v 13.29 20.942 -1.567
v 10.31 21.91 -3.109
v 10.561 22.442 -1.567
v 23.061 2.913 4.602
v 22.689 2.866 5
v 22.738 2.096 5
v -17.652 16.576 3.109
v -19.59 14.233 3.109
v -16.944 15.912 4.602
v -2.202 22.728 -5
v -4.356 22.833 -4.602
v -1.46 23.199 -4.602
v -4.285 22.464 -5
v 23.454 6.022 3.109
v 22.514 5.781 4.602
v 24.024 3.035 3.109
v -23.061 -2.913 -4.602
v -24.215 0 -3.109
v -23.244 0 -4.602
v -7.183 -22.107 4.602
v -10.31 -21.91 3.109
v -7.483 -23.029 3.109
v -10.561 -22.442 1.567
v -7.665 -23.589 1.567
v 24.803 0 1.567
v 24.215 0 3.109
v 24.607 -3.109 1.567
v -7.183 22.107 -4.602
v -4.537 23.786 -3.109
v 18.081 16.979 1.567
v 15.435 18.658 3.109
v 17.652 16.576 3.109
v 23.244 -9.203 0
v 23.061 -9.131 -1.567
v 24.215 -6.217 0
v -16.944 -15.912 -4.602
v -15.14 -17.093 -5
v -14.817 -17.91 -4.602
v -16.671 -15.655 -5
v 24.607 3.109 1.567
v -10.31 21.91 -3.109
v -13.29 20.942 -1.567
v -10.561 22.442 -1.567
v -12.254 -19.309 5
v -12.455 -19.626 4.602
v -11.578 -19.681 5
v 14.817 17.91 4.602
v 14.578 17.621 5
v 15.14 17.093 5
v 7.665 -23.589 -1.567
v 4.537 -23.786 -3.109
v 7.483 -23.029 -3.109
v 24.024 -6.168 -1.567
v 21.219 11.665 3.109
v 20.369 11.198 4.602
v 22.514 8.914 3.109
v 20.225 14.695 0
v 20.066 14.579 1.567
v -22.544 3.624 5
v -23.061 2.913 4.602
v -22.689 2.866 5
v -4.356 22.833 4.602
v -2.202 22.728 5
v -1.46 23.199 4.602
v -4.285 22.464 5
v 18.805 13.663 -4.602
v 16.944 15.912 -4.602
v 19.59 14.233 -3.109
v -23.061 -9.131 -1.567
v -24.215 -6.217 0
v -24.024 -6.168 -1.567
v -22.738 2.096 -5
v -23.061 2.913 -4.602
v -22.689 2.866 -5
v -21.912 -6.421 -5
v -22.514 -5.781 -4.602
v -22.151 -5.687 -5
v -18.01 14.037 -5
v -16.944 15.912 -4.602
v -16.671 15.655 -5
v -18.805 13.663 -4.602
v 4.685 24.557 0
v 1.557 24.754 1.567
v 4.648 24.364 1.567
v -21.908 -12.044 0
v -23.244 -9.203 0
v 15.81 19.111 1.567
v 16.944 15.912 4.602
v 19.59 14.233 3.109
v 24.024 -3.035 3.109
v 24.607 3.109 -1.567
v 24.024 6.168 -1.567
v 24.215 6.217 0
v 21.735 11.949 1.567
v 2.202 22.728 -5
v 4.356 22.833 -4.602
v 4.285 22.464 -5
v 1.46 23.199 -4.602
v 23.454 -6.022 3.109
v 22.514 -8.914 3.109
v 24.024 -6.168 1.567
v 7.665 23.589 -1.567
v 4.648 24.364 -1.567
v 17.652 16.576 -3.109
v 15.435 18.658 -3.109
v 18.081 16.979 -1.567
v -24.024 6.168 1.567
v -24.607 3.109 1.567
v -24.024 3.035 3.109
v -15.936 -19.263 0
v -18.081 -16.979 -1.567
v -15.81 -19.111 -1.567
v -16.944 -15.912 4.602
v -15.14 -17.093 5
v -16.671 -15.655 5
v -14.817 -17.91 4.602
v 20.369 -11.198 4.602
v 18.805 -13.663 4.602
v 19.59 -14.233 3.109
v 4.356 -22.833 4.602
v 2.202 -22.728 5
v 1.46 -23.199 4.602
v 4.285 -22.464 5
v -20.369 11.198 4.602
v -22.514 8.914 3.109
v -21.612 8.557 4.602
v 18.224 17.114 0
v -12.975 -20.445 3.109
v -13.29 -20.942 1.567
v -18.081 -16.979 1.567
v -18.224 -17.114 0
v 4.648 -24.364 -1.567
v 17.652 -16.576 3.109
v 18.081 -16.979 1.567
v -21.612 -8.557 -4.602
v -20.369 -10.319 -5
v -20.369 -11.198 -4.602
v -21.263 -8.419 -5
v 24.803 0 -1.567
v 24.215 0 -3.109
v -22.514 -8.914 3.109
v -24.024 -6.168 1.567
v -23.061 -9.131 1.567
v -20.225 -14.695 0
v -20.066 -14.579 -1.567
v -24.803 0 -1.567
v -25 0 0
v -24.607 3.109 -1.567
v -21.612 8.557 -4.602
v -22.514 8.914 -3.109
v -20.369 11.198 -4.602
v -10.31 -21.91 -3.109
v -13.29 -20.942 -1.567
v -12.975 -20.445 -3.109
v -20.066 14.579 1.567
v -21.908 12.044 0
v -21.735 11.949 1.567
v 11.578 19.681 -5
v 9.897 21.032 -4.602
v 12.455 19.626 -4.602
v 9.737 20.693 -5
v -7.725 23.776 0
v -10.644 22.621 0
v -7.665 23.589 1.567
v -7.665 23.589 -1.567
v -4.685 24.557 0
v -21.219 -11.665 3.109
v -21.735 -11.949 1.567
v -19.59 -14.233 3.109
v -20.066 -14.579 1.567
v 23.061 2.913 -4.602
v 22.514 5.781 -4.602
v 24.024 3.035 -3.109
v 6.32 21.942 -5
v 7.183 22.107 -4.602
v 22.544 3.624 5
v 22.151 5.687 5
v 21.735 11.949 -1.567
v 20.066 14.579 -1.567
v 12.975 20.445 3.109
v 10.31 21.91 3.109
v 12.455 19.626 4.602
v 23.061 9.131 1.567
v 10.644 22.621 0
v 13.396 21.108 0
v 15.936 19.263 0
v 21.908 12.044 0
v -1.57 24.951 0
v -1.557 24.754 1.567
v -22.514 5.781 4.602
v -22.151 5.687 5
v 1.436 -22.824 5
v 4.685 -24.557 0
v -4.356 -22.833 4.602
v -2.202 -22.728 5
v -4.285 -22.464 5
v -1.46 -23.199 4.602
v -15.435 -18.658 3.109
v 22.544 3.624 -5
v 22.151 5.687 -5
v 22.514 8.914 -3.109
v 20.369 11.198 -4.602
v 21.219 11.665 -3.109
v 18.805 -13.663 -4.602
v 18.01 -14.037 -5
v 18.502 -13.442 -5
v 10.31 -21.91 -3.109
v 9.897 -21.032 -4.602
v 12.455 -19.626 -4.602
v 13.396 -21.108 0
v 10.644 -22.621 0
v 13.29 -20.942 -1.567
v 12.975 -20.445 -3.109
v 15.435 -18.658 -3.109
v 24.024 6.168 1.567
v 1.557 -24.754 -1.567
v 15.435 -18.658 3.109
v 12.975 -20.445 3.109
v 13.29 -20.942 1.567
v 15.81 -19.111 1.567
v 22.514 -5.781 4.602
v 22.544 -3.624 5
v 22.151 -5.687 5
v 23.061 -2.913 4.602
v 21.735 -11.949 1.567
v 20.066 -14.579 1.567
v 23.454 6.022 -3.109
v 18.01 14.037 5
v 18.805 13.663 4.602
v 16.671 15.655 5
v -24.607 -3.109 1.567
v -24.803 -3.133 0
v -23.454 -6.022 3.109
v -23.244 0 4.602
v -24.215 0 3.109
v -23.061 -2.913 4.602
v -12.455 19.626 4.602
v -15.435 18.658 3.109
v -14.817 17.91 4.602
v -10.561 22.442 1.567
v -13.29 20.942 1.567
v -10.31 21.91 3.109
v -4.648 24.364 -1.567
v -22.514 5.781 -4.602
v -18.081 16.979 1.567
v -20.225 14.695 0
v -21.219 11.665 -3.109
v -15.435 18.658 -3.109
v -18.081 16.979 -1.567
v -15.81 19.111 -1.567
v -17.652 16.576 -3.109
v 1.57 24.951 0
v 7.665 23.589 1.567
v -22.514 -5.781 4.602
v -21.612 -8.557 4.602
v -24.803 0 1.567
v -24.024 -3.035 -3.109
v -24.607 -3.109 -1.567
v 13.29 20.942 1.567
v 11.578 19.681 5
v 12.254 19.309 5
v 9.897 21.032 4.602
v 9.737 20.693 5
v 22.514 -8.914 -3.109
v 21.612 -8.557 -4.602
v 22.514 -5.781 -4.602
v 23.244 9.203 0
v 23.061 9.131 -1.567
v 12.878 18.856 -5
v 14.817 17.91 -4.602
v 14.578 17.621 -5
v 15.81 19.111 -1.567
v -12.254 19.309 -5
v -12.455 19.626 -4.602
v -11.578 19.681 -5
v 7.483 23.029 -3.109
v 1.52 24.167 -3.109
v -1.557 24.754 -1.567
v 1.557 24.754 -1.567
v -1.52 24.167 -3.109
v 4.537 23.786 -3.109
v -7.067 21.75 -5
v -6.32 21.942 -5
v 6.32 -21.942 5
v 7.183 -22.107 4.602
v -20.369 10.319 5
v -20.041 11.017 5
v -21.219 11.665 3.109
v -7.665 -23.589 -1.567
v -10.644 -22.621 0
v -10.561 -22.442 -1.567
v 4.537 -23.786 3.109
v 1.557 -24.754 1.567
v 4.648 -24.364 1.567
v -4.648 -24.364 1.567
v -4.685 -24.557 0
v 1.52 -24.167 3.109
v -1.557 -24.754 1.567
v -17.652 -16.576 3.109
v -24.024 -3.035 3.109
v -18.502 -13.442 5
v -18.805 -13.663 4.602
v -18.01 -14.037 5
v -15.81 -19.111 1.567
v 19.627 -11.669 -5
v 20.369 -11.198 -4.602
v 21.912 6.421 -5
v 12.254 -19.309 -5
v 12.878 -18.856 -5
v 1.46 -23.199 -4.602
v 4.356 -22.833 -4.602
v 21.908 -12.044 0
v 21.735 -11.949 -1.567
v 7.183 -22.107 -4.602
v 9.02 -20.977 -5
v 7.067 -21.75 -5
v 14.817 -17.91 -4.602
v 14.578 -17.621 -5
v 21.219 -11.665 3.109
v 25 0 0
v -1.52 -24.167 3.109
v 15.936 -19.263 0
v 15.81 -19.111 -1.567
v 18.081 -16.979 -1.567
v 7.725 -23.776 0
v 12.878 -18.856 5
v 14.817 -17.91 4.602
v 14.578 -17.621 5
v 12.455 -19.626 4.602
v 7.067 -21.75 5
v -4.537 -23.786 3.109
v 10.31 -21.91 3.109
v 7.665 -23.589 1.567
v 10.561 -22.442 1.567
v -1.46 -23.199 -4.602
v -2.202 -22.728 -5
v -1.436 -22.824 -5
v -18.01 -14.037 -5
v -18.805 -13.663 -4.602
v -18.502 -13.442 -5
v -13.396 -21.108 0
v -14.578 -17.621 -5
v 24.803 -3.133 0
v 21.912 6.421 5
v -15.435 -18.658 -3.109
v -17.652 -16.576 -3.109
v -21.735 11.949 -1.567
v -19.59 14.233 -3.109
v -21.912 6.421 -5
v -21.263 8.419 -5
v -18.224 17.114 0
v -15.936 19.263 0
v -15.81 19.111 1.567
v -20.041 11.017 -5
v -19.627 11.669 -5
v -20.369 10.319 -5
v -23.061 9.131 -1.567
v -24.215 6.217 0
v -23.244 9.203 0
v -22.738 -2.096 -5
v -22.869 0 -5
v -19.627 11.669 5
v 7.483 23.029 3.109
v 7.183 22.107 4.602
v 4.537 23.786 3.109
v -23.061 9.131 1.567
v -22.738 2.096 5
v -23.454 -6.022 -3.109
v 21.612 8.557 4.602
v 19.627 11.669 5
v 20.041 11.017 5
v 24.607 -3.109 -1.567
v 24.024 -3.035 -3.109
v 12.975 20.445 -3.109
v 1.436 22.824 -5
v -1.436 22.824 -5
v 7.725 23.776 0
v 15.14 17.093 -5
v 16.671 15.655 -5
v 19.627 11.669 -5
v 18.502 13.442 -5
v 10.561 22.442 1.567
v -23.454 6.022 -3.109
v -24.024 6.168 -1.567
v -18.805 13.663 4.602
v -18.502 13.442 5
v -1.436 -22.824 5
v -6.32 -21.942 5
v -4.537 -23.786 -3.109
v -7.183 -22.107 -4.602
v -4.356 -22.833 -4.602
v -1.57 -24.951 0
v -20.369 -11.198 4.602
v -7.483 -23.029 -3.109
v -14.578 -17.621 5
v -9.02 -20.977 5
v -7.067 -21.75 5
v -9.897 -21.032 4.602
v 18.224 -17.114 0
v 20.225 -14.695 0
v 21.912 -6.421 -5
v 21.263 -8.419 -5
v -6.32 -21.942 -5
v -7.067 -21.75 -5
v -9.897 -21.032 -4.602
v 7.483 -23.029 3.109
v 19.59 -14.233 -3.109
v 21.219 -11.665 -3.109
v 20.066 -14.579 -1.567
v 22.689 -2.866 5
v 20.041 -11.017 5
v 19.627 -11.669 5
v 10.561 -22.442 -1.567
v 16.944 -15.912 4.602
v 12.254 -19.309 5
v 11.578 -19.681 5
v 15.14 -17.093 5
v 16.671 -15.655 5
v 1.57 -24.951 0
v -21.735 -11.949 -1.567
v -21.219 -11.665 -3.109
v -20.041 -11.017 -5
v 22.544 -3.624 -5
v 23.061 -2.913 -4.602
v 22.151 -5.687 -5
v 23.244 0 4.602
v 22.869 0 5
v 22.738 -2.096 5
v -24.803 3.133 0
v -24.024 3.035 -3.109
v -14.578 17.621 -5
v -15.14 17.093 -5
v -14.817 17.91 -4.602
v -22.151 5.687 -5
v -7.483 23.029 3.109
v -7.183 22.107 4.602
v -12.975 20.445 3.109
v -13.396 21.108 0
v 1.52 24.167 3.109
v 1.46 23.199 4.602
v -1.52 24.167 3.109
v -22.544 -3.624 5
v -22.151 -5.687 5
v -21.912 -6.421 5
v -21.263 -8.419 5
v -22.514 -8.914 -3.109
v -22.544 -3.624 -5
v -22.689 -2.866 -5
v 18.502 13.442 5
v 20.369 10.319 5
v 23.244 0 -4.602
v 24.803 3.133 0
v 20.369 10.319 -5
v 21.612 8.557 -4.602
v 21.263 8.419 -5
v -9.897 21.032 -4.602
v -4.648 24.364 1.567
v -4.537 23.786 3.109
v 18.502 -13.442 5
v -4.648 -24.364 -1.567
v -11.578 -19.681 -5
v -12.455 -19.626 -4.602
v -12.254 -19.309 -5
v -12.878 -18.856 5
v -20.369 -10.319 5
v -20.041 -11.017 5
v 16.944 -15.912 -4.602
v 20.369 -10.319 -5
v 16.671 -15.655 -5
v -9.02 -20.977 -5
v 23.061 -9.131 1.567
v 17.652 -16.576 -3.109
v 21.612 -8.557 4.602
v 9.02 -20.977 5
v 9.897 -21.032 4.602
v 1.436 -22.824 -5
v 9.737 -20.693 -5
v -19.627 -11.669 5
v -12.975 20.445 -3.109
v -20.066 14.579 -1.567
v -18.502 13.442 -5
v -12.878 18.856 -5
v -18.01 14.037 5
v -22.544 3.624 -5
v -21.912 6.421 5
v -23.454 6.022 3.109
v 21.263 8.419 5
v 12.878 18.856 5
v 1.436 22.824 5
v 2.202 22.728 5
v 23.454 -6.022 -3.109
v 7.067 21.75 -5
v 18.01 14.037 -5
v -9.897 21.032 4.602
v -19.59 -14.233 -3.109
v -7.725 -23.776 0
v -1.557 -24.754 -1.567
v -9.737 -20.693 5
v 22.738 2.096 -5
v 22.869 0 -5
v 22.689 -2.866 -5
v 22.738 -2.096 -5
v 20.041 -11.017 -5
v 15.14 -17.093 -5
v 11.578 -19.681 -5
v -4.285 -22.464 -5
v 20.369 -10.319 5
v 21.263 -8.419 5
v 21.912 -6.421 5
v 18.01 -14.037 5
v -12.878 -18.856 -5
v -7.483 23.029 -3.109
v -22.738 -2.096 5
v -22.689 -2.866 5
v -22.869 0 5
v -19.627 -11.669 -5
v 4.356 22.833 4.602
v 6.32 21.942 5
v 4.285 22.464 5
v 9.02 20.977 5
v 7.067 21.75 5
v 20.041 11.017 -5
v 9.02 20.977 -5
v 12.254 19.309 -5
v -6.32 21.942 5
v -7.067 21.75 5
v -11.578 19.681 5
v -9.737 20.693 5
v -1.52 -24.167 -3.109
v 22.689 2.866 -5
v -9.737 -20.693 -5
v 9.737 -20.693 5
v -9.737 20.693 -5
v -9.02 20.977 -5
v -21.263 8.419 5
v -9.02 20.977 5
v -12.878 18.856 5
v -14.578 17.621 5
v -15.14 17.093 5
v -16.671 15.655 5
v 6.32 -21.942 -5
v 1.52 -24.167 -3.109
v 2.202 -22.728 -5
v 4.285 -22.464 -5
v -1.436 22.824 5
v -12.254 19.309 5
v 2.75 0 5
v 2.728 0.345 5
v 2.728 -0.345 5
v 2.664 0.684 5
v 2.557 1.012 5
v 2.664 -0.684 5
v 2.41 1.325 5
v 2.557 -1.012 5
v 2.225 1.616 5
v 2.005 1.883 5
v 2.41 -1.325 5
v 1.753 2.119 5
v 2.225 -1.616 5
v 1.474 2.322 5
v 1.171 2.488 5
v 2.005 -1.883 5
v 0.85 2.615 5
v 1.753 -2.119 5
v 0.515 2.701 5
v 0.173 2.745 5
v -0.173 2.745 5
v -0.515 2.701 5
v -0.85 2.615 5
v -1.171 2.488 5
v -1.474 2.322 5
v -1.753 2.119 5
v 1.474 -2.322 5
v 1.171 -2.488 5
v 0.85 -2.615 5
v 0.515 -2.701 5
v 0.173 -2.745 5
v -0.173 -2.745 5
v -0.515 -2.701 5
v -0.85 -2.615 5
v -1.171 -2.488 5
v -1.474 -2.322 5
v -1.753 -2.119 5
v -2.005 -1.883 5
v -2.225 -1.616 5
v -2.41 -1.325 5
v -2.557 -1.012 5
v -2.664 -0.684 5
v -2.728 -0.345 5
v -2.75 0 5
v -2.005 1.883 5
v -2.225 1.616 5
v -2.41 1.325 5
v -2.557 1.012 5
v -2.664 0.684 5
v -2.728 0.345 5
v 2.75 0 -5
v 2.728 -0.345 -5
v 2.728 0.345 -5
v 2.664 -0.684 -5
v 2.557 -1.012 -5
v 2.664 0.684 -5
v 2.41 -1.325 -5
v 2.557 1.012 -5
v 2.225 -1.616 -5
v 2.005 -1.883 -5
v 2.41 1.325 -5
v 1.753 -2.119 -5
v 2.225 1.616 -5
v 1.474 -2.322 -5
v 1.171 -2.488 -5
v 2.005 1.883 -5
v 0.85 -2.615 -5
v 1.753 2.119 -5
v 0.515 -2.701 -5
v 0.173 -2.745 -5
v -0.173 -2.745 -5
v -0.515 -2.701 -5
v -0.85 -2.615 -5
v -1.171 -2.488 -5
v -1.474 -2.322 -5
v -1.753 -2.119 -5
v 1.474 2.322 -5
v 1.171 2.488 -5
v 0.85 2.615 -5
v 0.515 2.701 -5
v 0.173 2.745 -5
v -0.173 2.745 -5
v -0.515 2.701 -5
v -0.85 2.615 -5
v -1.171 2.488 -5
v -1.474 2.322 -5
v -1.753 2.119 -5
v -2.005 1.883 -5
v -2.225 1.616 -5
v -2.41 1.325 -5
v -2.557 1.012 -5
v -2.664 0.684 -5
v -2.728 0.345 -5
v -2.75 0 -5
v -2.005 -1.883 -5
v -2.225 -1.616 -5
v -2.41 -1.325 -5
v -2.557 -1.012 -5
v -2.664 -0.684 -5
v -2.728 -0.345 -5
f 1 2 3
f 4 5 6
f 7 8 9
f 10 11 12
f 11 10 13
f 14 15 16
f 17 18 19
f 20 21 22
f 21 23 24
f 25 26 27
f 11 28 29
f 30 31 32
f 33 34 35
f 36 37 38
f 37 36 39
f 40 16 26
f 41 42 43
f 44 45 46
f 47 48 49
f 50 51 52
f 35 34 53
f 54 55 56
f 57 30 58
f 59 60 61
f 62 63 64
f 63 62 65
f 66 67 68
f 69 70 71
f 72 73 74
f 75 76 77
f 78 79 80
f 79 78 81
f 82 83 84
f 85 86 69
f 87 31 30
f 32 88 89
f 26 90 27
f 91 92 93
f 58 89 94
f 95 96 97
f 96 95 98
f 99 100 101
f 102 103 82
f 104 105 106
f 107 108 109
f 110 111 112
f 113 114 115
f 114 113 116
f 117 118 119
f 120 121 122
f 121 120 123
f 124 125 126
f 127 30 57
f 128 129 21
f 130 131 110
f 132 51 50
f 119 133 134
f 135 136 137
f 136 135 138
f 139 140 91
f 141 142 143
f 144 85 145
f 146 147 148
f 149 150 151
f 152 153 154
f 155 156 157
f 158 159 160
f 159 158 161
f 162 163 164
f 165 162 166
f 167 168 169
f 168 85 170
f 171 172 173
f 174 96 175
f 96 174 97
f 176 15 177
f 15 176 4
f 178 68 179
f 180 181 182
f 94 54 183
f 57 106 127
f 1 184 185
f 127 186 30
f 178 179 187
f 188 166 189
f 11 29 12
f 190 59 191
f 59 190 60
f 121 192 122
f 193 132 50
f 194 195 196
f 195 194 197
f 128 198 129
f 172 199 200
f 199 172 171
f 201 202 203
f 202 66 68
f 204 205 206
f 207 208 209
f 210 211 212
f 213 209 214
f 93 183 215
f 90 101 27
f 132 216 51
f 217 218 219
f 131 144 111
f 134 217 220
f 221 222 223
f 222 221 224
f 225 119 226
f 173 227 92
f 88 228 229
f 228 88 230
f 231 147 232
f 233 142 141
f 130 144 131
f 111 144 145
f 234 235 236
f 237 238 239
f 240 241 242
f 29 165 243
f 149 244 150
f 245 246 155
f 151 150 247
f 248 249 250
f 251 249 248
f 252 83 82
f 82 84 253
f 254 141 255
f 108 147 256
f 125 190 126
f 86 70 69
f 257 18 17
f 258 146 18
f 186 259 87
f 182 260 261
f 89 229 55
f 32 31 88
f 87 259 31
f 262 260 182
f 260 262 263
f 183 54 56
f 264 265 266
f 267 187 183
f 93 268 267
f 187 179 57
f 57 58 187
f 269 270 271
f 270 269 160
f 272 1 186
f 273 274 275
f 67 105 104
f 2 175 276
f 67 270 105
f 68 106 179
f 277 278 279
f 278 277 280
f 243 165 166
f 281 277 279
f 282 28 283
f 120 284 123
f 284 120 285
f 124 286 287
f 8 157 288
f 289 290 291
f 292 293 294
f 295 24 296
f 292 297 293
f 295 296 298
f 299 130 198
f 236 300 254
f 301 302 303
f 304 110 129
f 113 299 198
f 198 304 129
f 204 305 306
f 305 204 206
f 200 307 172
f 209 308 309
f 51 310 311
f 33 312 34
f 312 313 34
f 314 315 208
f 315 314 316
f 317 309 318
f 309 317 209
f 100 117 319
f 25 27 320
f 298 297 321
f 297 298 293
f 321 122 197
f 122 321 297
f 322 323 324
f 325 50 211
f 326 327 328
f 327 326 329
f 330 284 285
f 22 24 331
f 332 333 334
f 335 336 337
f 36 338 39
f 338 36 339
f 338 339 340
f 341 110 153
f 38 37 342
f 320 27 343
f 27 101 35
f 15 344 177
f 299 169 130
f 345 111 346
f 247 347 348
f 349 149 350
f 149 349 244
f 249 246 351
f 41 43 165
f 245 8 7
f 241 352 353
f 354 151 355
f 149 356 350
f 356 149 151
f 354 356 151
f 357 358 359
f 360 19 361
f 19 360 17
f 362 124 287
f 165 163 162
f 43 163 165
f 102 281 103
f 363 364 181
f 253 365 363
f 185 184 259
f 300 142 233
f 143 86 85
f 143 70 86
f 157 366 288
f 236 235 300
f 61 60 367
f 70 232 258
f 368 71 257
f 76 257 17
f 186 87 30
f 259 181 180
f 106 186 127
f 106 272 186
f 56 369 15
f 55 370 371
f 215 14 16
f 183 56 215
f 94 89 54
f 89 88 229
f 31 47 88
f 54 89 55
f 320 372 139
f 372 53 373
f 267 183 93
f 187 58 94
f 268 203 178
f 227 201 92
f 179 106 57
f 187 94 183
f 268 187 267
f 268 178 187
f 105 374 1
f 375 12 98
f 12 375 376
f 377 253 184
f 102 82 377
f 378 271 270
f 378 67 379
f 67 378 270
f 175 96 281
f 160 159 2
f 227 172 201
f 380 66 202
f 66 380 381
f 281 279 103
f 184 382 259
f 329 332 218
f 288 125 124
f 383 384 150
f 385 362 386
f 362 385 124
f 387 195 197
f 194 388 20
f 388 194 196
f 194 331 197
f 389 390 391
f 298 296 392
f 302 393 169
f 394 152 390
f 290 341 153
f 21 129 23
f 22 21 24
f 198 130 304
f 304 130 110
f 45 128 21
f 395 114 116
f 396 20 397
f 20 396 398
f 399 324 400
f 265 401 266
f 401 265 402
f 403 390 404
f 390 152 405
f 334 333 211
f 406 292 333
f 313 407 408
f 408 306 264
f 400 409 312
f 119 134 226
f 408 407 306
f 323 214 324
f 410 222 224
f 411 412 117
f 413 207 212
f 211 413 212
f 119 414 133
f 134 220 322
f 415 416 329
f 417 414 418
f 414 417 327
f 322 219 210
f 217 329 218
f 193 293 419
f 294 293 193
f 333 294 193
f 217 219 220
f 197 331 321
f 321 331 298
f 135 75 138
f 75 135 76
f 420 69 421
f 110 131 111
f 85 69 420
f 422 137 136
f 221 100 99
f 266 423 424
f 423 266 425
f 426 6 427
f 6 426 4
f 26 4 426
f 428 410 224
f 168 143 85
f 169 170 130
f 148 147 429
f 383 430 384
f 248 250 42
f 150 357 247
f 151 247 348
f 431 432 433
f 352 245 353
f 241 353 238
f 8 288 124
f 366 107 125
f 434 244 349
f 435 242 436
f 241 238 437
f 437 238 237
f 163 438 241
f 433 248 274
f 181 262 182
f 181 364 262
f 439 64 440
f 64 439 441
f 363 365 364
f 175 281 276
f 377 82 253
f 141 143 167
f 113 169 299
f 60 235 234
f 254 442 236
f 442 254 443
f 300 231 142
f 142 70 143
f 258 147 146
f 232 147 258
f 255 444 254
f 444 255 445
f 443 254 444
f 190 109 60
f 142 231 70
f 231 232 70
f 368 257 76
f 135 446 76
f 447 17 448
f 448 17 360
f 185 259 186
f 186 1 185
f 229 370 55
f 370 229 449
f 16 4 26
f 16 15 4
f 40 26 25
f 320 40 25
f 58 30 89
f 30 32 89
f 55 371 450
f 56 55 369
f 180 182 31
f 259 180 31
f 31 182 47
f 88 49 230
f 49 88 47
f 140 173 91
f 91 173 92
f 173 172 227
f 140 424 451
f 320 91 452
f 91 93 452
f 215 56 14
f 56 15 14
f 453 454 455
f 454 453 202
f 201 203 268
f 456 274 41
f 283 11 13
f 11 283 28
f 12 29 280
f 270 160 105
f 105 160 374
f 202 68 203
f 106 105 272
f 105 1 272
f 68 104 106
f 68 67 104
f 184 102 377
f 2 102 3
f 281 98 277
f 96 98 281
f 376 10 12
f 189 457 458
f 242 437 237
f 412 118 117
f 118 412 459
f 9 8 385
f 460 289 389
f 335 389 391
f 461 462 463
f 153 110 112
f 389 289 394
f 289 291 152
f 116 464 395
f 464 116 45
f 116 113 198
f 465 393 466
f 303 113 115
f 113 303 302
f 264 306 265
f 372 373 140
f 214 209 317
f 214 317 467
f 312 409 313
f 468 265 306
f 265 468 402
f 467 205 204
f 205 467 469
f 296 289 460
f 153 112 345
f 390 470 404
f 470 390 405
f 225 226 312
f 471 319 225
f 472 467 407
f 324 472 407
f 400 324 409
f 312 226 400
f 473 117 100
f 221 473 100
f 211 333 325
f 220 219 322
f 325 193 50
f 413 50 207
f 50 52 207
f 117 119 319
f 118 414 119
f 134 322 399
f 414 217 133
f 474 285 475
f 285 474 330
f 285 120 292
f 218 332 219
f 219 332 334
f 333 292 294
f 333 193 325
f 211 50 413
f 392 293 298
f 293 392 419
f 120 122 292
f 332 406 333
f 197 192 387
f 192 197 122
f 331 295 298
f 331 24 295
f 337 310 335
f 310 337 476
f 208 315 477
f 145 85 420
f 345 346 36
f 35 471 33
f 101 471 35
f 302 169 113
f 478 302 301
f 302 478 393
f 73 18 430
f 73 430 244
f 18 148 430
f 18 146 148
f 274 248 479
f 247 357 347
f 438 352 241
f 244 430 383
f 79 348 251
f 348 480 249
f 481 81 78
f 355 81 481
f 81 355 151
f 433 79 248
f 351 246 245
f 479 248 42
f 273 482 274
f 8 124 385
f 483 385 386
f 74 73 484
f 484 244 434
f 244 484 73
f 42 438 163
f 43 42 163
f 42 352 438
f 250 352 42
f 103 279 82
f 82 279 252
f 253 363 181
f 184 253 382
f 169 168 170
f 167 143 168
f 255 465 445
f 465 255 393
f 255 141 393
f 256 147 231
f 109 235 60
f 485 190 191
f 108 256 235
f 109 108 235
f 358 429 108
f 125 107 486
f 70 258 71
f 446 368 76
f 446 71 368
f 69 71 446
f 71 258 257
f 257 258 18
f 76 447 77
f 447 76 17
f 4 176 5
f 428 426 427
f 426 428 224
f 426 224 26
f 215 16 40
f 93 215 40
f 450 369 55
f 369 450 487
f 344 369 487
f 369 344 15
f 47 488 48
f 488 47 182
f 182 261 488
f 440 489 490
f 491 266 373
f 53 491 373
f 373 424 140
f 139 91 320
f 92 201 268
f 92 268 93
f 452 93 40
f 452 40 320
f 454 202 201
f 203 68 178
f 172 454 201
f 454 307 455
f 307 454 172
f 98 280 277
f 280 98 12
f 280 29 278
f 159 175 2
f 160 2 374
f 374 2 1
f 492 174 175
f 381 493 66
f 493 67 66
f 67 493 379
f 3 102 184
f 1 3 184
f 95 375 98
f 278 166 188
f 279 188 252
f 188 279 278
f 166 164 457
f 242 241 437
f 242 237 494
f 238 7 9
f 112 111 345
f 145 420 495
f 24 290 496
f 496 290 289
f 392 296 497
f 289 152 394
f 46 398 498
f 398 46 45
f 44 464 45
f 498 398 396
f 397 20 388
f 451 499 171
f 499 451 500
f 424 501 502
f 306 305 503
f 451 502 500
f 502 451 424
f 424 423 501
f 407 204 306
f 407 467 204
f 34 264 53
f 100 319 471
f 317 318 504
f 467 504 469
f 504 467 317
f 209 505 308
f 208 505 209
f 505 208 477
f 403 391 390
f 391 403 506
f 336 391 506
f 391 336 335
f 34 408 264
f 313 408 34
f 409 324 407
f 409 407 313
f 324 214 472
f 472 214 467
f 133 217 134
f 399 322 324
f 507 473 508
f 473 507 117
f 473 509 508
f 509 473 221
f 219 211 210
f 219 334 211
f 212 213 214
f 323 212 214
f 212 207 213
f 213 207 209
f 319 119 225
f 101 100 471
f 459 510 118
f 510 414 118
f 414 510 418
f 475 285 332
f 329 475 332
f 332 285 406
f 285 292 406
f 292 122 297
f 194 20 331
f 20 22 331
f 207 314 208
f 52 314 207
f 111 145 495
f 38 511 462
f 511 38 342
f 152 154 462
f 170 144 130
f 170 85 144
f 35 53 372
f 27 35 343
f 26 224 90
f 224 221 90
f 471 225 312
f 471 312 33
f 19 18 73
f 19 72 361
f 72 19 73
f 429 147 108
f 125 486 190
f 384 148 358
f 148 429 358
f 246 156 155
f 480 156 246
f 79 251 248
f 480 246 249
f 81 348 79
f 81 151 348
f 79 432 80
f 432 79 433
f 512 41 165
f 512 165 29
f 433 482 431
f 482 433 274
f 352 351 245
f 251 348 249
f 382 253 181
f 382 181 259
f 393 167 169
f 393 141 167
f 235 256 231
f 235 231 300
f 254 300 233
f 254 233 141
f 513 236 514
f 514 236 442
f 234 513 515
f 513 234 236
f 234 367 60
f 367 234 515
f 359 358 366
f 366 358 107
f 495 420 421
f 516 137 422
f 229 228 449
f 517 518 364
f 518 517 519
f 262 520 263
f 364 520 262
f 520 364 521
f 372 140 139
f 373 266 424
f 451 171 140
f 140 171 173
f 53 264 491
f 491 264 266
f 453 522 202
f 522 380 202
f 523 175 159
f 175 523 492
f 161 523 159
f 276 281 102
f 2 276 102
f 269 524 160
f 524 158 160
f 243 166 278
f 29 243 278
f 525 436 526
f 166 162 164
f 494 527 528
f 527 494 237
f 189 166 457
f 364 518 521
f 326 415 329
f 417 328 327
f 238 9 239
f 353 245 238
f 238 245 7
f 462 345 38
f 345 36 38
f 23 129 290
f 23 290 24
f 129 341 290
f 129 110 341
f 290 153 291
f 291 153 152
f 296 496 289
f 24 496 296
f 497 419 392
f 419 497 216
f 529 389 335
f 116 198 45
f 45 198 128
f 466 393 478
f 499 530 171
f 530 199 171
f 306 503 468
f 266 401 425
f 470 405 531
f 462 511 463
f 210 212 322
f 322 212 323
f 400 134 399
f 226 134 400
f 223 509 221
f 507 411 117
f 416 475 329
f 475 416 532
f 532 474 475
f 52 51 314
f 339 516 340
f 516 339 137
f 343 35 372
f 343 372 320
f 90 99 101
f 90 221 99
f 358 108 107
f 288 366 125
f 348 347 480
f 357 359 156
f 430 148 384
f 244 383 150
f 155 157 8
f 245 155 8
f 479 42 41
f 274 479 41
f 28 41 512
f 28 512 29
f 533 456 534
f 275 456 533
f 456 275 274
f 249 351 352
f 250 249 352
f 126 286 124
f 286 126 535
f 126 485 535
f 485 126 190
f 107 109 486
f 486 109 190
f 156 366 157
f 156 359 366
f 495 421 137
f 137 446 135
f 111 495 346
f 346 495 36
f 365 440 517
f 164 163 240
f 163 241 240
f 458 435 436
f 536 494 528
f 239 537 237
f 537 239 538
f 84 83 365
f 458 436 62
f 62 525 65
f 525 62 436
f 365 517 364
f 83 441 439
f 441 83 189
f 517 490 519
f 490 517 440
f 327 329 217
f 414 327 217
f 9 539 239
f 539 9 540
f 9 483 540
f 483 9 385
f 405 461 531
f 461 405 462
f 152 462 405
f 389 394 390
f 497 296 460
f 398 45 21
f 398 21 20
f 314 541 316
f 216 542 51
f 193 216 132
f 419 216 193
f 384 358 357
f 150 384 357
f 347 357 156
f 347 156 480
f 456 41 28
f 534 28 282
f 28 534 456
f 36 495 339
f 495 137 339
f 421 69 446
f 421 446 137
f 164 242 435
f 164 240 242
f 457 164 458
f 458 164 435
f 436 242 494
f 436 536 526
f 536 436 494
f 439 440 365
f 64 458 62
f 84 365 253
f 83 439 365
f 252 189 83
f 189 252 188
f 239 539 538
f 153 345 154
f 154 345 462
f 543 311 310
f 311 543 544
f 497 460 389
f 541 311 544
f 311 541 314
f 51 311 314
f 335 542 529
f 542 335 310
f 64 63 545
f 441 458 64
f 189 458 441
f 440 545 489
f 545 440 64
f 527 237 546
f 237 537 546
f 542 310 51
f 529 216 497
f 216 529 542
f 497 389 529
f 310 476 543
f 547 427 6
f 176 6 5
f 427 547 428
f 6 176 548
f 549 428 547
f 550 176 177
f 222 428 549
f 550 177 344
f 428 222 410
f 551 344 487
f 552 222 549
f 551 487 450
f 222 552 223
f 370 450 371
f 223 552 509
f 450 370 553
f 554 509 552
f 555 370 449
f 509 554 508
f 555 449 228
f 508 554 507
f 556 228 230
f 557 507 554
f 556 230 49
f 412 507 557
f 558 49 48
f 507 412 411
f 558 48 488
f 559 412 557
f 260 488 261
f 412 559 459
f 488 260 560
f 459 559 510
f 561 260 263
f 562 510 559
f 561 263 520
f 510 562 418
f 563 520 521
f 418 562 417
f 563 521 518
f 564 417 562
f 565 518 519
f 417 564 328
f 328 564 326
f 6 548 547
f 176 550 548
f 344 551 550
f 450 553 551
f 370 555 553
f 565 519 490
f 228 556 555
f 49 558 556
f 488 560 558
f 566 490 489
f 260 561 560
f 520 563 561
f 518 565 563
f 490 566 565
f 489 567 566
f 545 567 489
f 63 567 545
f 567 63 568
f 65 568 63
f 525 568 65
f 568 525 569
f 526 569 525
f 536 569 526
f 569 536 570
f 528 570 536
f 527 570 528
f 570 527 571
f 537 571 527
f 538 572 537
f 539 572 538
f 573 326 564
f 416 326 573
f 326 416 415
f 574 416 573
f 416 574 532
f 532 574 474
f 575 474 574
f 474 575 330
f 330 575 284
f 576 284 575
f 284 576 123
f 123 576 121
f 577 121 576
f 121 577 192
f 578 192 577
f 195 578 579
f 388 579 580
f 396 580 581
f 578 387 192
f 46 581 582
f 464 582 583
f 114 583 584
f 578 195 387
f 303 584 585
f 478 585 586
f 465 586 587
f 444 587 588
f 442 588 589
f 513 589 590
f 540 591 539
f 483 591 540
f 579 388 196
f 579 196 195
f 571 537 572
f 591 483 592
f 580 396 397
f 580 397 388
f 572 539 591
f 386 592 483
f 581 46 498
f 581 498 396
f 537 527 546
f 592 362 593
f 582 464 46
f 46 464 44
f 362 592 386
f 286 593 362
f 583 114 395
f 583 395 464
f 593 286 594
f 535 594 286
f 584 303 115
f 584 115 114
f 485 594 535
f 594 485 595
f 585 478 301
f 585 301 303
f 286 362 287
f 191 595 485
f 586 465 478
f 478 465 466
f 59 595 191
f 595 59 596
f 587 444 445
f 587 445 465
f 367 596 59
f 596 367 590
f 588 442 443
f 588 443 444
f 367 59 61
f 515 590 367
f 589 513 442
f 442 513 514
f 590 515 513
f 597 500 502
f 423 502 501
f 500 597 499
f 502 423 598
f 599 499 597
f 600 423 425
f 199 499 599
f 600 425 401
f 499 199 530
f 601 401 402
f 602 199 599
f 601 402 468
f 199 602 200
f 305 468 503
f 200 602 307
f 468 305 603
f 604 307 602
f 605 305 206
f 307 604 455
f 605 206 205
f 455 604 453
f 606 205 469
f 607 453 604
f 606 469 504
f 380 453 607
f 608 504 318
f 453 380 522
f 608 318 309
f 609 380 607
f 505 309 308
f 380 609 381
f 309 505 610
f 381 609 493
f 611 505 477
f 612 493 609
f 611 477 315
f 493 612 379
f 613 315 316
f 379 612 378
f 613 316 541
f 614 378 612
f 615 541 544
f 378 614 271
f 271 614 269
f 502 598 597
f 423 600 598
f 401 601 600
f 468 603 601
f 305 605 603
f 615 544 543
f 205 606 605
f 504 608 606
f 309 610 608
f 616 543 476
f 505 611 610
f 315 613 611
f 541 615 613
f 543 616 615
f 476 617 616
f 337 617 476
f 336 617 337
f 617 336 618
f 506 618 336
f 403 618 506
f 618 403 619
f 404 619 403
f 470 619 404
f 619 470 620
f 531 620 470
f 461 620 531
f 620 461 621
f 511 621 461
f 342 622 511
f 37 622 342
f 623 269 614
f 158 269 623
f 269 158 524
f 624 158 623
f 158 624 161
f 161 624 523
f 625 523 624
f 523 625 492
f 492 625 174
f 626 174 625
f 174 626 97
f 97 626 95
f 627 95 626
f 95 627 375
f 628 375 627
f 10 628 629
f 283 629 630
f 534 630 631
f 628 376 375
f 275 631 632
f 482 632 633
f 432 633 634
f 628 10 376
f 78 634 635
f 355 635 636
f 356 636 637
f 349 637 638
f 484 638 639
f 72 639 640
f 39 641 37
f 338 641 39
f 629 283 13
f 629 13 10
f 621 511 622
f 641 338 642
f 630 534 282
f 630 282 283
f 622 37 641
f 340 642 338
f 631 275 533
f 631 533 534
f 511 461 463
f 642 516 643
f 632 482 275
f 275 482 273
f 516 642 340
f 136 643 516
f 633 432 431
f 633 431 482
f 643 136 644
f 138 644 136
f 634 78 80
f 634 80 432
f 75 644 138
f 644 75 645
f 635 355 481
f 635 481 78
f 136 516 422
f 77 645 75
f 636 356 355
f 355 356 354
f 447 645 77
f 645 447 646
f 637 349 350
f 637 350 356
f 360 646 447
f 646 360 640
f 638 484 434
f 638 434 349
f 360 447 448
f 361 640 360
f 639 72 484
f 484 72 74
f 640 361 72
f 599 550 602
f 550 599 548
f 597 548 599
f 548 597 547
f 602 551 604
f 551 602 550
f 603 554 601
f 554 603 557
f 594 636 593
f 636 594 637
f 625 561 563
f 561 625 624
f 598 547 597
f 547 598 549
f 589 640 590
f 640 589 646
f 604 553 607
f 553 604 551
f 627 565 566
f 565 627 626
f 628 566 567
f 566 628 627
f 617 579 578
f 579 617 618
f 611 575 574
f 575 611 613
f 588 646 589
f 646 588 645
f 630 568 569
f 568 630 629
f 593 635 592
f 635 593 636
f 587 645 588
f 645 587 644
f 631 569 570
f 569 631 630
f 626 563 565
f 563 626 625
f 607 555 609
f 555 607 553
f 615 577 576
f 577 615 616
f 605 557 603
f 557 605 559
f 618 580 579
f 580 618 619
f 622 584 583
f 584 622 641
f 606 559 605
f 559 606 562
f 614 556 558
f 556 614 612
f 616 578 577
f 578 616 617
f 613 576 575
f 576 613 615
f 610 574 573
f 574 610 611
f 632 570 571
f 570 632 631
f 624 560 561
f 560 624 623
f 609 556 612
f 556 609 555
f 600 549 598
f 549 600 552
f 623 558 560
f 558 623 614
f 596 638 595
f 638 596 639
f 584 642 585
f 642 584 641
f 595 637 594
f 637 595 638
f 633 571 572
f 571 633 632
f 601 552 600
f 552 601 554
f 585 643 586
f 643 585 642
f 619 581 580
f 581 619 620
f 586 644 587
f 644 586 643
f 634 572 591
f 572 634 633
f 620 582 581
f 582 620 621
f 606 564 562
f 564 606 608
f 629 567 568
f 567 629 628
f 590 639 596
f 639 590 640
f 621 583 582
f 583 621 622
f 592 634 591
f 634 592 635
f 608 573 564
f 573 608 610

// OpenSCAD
// Total Whell size (diameter)
Size = 50;
// Radius of rotated circle / Height of "Donut"
Width = 10;
// Central Hole diameter to mount in millimeters
CenterHoleDiameter=5;

/* [Hidden] */
$fn=50;
difference(){
    intersection(){
        scale([1,1,0.5]) sphere(d=Size,$fn=50);
        cube([Size*2,Size*2,Width],center=true);
    }
    if(CenterHoleDiameter > 0)cylinder(d=CenterHoleDiameter+0.5,h=Width*3,center=true);
}
